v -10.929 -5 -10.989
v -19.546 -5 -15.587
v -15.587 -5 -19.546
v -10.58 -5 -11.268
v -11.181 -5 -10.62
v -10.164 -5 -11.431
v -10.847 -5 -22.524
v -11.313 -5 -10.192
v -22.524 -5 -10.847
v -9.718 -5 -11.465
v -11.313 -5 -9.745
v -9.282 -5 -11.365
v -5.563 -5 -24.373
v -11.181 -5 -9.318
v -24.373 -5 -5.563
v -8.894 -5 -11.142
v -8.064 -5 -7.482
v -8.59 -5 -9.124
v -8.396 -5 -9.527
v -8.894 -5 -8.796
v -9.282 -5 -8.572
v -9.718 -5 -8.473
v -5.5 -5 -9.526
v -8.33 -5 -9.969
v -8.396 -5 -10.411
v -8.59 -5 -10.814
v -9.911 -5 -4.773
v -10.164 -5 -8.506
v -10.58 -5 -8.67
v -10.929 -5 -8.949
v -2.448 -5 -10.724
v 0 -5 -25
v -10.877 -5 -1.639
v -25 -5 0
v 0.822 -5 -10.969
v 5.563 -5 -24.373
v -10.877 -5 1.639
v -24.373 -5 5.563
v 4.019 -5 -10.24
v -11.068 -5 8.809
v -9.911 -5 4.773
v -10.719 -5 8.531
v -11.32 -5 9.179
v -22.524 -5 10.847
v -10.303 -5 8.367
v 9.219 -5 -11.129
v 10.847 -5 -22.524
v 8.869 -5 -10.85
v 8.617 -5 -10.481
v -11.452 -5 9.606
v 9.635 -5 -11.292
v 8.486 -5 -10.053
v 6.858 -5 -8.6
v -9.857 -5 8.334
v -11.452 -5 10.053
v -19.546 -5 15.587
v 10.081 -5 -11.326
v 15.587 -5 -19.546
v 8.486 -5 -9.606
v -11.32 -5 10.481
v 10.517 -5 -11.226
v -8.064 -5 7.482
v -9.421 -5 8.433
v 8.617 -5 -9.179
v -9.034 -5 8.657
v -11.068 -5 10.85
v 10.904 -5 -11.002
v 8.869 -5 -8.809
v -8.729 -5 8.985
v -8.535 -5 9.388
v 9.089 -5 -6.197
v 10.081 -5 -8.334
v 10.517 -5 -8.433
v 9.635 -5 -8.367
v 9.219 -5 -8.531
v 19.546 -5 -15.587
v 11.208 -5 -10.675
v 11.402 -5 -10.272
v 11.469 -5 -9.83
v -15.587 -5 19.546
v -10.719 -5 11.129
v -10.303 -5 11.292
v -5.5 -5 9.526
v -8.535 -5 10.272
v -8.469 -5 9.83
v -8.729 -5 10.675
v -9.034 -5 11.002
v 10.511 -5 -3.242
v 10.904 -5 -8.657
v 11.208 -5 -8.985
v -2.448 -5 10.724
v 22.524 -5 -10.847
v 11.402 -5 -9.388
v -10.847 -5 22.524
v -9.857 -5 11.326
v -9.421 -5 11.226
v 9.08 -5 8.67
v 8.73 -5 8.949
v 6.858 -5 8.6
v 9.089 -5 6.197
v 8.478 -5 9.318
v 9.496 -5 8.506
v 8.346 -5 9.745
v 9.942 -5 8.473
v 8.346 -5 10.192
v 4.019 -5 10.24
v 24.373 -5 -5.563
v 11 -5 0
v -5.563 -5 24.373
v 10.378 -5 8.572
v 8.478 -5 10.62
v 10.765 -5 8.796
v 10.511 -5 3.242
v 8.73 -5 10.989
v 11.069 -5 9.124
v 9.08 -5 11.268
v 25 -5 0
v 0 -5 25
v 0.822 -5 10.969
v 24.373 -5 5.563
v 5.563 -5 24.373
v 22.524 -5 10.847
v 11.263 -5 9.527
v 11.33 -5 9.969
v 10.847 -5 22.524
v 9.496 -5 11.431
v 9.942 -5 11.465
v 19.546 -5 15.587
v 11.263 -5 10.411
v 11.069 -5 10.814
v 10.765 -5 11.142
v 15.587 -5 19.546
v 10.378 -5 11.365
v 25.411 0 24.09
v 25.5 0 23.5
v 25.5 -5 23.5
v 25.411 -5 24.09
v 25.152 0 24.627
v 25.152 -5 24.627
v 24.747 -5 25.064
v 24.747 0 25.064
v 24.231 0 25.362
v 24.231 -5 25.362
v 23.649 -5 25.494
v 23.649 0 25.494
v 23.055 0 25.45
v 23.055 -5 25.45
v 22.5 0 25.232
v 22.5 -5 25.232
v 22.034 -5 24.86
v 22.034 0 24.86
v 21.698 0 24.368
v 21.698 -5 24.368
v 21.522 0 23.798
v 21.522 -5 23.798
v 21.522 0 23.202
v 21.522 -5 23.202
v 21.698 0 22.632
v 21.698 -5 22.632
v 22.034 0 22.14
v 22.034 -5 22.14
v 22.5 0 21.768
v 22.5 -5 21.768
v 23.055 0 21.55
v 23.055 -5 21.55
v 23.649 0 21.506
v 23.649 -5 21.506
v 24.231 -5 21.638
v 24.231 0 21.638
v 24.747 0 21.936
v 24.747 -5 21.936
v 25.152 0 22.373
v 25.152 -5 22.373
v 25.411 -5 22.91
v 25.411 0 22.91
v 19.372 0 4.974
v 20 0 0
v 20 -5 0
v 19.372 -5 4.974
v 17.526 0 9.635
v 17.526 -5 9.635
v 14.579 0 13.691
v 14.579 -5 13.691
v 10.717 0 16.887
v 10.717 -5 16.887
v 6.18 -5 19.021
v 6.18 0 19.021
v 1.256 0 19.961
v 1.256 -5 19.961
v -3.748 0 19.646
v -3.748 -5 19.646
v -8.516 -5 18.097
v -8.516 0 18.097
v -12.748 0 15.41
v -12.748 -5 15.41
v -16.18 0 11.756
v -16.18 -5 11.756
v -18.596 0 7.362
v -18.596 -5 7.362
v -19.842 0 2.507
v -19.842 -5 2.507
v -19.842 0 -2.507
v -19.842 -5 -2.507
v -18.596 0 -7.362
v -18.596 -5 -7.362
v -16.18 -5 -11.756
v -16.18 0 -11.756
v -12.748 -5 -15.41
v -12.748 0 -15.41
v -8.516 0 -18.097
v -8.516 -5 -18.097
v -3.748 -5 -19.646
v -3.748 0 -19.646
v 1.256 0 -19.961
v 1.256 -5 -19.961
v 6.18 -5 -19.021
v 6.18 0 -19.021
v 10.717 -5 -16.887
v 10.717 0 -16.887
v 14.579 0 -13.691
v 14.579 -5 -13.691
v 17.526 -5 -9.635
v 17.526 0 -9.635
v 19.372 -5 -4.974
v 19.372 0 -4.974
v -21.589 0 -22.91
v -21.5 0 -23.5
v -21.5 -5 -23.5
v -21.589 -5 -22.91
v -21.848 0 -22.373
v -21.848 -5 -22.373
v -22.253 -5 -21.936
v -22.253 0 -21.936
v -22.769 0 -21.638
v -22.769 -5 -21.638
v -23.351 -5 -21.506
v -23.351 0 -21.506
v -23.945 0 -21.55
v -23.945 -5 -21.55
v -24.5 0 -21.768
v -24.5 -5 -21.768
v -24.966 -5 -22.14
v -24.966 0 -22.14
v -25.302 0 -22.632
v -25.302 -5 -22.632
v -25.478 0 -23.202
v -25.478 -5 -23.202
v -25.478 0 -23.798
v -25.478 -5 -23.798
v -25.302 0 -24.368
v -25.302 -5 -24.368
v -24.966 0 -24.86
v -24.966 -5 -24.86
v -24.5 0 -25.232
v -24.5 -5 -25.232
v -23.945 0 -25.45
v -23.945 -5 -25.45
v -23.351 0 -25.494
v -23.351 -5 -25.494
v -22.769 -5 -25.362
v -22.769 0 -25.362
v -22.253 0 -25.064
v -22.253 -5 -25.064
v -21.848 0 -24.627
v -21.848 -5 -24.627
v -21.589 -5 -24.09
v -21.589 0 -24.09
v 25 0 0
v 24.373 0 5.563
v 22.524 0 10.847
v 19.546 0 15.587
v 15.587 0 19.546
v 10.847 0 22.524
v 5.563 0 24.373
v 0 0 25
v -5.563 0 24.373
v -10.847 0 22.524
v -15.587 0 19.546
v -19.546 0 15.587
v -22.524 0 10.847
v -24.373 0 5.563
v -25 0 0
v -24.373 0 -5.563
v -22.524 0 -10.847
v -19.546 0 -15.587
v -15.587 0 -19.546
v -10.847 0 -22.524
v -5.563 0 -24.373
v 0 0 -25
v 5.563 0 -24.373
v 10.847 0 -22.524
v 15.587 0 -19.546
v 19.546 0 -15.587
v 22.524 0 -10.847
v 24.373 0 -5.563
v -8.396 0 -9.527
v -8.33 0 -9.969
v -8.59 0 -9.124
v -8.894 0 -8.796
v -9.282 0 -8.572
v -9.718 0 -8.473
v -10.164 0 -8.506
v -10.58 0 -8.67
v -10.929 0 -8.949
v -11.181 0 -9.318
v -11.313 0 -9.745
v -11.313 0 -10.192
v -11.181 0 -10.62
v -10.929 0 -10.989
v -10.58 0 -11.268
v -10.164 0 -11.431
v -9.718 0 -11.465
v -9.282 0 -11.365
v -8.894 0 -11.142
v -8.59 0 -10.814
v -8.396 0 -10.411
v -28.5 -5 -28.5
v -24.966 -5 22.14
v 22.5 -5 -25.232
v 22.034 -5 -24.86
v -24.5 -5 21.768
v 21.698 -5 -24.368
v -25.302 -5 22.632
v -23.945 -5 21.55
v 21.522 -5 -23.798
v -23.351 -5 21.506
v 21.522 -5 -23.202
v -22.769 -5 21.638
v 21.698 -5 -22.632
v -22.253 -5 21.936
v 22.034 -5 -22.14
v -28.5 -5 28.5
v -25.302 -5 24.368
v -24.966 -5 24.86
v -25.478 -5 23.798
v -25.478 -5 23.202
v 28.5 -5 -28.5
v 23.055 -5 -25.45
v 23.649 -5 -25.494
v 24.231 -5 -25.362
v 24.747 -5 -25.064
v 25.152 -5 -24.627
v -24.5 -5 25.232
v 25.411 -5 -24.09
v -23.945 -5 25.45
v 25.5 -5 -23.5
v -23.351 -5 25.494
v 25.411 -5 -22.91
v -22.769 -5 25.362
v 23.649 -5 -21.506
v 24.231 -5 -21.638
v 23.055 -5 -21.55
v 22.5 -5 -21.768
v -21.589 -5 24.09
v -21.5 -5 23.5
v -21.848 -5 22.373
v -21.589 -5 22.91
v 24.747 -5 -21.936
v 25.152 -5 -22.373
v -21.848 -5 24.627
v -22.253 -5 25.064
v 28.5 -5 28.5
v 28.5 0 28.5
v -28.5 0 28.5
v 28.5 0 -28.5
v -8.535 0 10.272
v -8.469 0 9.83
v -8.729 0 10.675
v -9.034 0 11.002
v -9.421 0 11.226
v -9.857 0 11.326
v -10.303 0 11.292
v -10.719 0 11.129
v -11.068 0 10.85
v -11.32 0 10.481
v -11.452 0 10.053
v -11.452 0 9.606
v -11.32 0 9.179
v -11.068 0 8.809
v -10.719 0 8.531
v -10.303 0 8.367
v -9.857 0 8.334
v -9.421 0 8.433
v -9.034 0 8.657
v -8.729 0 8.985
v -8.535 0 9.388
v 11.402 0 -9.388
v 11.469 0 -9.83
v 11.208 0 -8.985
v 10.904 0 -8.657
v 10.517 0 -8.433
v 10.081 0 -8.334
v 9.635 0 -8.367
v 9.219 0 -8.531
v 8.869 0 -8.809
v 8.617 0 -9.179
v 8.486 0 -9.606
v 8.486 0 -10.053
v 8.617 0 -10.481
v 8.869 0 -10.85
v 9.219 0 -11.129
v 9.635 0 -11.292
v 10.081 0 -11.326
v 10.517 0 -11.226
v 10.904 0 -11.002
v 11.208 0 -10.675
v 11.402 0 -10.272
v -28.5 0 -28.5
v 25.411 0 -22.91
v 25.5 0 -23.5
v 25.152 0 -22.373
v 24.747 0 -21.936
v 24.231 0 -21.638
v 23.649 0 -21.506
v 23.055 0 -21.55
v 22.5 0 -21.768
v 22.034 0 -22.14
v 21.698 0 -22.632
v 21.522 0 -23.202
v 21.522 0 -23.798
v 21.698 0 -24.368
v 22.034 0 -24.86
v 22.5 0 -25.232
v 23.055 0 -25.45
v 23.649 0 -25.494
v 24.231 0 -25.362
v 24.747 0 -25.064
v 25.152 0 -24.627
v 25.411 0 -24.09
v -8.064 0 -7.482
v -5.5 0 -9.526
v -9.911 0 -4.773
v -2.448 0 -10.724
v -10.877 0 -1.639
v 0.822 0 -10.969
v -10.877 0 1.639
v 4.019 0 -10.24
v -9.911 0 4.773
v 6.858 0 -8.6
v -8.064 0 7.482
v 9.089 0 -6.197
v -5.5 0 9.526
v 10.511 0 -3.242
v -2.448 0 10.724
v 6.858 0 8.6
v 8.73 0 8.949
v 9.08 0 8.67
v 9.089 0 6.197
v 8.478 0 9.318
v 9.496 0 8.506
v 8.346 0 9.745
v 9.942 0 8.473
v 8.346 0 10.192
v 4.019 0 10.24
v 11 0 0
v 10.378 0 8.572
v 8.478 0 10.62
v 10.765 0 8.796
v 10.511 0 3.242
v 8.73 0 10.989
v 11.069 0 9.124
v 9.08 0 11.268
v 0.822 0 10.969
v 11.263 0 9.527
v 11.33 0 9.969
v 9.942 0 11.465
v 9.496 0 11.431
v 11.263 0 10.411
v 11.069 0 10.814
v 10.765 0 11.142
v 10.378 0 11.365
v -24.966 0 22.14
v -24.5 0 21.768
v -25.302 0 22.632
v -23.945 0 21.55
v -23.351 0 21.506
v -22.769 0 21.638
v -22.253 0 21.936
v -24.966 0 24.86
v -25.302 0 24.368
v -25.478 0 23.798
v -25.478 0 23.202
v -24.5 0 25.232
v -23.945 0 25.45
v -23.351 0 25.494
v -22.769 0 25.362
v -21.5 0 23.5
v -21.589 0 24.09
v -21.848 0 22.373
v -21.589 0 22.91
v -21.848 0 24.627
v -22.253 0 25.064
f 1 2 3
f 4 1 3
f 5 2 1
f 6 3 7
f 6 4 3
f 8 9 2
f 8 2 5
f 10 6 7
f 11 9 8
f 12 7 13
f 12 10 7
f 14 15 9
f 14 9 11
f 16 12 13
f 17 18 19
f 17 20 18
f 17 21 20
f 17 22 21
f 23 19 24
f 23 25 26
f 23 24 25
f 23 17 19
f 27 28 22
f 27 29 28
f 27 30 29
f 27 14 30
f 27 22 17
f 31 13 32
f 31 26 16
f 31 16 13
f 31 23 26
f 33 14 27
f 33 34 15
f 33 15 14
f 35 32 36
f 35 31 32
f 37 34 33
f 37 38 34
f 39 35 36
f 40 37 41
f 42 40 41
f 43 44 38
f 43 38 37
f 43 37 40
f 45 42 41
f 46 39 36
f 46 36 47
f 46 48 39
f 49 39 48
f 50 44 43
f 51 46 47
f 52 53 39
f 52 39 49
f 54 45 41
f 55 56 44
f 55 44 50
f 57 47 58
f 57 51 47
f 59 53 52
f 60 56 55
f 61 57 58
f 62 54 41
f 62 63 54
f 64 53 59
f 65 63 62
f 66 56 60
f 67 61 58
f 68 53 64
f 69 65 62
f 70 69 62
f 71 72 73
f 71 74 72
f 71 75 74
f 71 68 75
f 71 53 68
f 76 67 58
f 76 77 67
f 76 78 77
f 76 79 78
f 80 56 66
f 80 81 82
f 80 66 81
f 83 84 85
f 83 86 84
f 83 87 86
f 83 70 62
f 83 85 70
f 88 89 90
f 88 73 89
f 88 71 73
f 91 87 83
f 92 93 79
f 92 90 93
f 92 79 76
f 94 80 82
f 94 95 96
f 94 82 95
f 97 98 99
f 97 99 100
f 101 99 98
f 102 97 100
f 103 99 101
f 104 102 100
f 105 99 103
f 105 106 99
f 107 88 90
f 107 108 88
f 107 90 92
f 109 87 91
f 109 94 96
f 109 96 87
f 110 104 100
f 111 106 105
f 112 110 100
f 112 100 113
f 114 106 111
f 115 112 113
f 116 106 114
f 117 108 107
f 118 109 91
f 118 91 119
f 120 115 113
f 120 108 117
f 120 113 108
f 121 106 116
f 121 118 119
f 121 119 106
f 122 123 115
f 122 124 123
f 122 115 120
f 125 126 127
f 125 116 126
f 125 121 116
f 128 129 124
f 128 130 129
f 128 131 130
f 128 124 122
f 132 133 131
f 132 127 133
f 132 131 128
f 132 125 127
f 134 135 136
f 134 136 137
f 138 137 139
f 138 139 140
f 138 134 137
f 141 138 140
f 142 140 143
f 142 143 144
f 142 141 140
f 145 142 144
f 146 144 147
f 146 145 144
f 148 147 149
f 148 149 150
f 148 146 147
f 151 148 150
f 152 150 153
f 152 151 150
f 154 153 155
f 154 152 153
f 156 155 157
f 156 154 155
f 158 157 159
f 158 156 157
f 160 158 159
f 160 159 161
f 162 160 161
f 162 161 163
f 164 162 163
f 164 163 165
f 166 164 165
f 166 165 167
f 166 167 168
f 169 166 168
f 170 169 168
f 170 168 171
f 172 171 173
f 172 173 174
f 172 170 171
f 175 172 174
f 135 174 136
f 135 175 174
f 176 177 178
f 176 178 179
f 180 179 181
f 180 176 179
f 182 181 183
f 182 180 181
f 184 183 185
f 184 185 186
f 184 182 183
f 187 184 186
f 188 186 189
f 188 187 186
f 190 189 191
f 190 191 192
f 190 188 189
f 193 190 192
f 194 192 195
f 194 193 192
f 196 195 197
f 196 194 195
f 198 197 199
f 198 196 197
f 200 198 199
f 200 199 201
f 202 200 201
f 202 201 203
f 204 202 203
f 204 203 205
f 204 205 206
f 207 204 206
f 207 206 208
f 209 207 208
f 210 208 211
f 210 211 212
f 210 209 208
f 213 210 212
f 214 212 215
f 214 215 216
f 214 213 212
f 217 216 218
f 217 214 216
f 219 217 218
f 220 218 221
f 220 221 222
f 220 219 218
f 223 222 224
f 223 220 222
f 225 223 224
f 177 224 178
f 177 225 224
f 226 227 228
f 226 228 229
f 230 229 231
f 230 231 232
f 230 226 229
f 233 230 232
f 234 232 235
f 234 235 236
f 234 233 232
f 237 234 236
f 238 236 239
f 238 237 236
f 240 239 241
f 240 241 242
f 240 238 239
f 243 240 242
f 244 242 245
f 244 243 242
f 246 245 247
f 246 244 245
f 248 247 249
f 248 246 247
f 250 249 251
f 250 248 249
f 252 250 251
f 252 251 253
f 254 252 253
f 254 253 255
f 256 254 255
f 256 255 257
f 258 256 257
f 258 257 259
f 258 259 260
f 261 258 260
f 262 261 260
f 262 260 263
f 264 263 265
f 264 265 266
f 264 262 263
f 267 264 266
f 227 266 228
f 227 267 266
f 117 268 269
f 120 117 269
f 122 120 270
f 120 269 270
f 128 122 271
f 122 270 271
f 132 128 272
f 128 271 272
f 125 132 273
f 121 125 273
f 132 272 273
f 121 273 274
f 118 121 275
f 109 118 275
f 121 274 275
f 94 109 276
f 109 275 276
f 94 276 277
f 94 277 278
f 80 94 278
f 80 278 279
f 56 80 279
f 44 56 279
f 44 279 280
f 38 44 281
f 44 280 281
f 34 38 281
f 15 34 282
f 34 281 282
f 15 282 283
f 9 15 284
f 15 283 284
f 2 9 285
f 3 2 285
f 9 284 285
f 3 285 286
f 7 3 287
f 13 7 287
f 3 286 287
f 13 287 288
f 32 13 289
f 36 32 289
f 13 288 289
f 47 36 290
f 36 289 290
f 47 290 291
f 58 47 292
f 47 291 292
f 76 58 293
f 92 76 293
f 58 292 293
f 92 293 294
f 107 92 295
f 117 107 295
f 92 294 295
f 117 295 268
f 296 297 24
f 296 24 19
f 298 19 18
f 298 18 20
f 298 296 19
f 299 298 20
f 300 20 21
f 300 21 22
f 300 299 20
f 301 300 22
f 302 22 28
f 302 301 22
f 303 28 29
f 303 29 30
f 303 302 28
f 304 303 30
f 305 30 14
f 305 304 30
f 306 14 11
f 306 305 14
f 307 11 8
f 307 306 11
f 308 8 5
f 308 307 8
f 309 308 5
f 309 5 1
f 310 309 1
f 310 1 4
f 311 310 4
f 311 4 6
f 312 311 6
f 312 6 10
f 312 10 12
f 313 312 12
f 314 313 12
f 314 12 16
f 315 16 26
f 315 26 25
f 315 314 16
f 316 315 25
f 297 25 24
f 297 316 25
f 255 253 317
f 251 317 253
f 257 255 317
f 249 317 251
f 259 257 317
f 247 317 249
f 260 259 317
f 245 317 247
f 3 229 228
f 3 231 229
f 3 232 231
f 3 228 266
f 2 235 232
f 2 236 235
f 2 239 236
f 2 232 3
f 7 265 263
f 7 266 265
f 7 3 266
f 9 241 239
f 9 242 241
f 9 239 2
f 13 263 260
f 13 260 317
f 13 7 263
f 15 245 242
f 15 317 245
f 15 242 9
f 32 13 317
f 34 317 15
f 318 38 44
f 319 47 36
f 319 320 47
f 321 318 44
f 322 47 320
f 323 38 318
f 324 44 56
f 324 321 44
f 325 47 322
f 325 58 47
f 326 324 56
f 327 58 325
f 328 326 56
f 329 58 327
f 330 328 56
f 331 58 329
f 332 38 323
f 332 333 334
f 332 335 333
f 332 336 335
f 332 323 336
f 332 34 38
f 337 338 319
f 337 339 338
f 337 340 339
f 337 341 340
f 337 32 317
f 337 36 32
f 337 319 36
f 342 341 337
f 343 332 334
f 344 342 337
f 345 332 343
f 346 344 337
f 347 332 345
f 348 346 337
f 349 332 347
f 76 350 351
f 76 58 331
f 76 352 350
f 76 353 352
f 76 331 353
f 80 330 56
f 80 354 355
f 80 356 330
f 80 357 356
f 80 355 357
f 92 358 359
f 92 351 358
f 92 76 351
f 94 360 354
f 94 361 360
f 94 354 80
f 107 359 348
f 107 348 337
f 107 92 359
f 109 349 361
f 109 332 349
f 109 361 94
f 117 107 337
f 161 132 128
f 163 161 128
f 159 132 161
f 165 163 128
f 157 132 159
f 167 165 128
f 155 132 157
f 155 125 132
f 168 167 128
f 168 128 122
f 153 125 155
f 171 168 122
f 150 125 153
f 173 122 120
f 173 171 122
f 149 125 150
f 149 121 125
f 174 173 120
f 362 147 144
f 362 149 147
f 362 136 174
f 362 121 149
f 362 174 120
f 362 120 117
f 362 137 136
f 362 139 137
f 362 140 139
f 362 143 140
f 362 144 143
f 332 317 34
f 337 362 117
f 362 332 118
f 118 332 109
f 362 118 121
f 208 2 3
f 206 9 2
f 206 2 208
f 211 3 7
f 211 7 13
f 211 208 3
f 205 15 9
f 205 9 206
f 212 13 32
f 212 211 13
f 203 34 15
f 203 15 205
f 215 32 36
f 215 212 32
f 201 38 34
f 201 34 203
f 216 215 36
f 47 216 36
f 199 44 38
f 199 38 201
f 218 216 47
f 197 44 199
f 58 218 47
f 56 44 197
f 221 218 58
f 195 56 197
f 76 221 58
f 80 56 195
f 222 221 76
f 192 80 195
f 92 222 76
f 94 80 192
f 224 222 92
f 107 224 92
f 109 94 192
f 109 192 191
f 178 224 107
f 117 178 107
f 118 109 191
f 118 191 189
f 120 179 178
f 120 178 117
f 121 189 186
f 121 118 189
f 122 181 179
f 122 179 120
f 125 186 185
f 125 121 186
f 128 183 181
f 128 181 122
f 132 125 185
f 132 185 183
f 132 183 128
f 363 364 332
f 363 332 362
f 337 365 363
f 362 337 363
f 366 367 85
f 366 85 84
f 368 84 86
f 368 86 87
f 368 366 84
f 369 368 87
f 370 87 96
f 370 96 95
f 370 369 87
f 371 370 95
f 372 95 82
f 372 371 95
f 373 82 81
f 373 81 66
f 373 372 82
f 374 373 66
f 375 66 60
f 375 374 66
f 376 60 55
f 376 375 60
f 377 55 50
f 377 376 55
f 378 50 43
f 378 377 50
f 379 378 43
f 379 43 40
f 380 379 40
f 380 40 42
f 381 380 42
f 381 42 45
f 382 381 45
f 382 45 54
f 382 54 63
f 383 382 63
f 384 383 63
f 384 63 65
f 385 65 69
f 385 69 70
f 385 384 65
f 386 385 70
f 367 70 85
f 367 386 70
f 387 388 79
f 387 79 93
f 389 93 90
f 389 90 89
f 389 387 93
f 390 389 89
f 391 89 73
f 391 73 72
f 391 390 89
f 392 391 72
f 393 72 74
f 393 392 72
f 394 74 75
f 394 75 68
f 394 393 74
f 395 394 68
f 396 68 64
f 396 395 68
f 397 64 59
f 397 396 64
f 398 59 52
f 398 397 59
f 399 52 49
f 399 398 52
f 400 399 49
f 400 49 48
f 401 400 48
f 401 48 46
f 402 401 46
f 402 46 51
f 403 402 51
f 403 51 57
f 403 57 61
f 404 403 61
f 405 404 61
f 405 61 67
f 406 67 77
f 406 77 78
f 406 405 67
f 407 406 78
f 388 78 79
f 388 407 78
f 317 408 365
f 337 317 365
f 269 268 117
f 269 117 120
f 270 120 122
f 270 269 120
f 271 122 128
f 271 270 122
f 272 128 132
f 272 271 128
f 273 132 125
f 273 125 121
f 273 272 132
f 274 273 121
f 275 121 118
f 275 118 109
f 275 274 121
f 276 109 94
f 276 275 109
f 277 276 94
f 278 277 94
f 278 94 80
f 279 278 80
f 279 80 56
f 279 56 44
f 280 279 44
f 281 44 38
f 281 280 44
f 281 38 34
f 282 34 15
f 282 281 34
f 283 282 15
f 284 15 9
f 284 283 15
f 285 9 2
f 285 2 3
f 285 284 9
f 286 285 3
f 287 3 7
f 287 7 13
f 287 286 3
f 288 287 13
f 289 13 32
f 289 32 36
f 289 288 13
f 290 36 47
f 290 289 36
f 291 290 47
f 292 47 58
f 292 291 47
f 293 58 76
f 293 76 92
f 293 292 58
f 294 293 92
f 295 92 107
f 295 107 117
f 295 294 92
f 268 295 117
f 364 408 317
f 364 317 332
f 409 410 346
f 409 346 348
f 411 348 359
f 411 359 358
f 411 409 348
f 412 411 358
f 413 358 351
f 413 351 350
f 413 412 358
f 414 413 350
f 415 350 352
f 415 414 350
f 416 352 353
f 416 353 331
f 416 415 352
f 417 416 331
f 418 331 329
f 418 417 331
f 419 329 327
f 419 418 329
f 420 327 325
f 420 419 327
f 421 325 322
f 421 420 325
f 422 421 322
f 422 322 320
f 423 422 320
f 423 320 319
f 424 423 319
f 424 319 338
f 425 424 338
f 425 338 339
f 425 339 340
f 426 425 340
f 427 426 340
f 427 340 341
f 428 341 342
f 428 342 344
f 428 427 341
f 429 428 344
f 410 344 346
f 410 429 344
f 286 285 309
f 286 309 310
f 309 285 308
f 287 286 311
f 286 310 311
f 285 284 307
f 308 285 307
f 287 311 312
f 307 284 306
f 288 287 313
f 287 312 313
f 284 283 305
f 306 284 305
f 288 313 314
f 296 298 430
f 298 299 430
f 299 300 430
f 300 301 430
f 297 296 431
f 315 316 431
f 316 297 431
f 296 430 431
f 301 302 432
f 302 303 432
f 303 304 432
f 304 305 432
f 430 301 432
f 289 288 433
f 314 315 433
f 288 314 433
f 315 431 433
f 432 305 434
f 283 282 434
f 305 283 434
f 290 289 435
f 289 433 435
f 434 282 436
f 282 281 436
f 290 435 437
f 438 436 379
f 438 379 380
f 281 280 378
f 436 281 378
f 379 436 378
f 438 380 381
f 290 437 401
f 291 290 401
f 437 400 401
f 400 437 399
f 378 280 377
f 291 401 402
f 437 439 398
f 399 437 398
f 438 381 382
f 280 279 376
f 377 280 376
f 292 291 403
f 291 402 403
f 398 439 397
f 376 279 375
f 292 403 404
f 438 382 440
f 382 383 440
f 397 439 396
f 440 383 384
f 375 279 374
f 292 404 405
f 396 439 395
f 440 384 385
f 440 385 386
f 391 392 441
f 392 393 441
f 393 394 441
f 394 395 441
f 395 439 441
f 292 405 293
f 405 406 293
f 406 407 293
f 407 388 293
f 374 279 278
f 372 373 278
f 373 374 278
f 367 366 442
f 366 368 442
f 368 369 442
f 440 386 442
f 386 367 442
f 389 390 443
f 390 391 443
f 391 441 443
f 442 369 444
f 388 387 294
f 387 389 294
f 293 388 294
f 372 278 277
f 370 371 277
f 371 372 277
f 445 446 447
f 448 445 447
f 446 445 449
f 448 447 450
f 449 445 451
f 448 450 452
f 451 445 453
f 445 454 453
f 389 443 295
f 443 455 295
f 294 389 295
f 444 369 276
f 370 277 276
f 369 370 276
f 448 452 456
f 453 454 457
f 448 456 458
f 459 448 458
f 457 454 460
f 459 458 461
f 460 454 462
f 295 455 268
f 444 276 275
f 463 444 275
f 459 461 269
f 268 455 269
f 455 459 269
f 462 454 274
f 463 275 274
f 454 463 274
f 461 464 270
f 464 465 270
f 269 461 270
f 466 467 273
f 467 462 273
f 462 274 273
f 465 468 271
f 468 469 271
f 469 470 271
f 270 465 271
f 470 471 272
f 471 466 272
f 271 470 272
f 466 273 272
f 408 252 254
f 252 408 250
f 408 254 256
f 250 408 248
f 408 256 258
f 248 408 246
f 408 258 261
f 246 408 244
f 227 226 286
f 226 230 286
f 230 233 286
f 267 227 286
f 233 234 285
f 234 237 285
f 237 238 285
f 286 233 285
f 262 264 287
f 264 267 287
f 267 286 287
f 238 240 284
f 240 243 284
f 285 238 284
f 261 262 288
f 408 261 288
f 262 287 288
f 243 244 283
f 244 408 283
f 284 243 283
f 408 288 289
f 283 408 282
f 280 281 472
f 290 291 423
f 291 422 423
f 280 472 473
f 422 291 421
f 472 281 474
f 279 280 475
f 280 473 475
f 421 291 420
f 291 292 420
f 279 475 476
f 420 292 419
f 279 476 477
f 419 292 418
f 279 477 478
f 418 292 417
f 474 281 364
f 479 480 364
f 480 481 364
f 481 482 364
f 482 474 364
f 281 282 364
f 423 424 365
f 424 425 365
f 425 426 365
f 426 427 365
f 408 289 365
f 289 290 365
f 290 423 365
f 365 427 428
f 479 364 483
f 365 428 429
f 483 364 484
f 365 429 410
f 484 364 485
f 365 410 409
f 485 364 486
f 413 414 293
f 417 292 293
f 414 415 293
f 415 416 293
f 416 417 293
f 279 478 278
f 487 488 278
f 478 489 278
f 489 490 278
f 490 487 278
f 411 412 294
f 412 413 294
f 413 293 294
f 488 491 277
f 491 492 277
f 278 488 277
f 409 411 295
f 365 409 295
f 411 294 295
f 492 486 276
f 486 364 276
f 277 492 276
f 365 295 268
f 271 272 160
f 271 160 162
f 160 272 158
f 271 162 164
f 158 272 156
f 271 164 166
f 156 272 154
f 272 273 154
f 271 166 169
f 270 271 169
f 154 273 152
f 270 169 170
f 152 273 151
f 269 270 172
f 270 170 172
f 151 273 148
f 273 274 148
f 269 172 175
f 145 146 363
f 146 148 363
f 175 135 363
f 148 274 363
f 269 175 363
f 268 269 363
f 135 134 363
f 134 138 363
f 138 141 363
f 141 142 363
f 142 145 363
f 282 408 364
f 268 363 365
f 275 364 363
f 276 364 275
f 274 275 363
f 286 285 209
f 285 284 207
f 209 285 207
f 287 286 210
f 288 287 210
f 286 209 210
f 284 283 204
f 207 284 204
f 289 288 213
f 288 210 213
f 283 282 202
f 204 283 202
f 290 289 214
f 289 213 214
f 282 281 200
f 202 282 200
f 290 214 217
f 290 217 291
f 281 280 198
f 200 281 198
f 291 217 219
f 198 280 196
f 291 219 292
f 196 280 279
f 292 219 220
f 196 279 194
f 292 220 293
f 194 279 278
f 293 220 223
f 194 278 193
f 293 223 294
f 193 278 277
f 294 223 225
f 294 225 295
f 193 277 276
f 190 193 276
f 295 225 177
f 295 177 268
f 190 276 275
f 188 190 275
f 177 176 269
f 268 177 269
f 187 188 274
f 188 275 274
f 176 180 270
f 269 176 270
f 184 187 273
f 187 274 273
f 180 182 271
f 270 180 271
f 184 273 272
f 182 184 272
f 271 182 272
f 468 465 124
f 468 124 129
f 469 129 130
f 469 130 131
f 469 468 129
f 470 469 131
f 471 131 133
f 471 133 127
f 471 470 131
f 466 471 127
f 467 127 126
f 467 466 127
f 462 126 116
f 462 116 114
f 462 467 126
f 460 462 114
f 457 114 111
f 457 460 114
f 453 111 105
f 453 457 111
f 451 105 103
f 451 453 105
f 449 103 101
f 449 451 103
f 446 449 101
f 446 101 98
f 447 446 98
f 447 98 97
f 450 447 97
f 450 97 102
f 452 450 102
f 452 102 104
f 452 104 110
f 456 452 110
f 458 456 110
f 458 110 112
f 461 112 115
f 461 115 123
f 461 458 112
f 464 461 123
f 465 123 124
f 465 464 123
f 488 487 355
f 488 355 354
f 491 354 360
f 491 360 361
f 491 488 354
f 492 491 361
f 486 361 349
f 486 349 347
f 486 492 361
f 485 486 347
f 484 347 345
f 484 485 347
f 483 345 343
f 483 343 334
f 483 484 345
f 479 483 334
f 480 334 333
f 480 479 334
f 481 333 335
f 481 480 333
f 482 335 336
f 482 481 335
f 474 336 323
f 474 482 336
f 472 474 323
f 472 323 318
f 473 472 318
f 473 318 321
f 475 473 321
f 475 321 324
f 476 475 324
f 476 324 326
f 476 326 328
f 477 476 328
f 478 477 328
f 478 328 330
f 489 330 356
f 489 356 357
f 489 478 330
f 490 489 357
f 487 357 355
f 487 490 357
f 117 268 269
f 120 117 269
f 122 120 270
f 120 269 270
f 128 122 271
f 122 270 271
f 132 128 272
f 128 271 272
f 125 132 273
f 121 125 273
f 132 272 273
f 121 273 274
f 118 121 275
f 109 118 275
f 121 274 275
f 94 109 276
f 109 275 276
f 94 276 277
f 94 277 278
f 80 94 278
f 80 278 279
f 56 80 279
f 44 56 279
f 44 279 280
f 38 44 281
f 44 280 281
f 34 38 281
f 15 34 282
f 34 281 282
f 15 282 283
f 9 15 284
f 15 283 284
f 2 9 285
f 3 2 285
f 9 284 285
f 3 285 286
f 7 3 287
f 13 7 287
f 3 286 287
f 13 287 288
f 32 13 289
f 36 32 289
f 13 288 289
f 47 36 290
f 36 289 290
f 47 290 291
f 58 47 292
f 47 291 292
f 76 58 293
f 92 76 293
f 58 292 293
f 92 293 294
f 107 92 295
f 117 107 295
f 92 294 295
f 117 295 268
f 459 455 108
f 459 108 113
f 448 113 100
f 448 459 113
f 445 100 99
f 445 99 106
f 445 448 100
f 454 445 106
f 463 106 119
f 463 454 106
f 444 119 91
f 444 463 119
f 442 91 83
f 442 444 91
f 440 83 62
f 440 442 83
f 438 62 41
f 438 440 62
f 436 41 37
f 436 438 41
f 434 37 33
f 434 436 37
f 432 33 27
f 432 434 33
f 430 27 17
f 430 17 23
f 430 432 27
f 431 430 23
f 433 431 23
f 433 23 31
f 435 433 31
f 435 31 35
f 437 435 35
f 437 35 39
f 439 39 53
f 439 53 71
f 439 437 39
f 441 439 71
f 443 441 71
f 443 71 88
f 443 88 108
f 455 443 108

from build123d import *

# Parameters (mm, degrees)
F0_W     = 57
F0_H     = 57
F0_R     = 2
F0_R_2   = 25
F1_DEPTH = 5
F0_R_3   = 20
F2_DEPTH = 5
F0_R_4   = 1.5
F0_R_5   = 11
F3_DEPTH = 5


with BuildPart() as f1:
    # F0 (on Front) → F1 (new body)
    with BuildSketch(Plane.XZ):
        Rectangle(F0_W, F0_H)
        with Locations((-23.5, -23.5)):
            Circle(F0_R, mode=Mode.SUBTRACT)
        with Locations((23.5, -23.5)):
            Circle(F0_R, mode=Mode.SUBTRACT)
        with Locations((-23.5, 23.5)):
            Circle(F0_R, mode=Mode.SUBTRACT)
        Circle(F0_R_2, mode=Mode.SUBTRACT)
        with Locations((23.5, 23.5)):
            Circle(F0_R, mode=Mode.SUBTRACT)
    extrude(amount=F1_DEPTH)


with BuildPart() as f2:
    # F0 (on Front) → F2 (new body)
    with BuildSketch(Plane.XZ):
        Circle(F0_R_2)
        Circle(F0_R_3, mode=Mode.SUBTRACT)
    extrude(amount=F2_DEPTH)


with BuildPart() as f3:
    # F0 (on Front) → F3 (new body)
    with BuildSketch(Plane.XZ):
        Circle(F0_R_2)
        Circle(F0_R_3, mode=Mode.SUBTRACT)
        Circle(F0_R_3)
        with Locations((-9.8297189121, -9.9687825791)):
            Circle(F0_R_4, mode=Mode.SUBTRACT)
        with Locations((9.9687825791, -9.8297189121)):
            Circle(F0_R_4, mode=Mode.SUBTRACT)
        with Locations((-9.9687825791, 9.8297189121)):
            Circle(F0_R_4, mode=Mode.SUBTRACT)
        Circle(F0_R_5, mode=Mode.SUBTRACT)
        with Locations((9.8297189121, 9.9687825791)):
            Circle(F0_R_4, mode=Mode.SUBTRACT)
    extrude(amount=F3_DEPTH)


solid = Compound([f1.part, f2.part, f3.part])
